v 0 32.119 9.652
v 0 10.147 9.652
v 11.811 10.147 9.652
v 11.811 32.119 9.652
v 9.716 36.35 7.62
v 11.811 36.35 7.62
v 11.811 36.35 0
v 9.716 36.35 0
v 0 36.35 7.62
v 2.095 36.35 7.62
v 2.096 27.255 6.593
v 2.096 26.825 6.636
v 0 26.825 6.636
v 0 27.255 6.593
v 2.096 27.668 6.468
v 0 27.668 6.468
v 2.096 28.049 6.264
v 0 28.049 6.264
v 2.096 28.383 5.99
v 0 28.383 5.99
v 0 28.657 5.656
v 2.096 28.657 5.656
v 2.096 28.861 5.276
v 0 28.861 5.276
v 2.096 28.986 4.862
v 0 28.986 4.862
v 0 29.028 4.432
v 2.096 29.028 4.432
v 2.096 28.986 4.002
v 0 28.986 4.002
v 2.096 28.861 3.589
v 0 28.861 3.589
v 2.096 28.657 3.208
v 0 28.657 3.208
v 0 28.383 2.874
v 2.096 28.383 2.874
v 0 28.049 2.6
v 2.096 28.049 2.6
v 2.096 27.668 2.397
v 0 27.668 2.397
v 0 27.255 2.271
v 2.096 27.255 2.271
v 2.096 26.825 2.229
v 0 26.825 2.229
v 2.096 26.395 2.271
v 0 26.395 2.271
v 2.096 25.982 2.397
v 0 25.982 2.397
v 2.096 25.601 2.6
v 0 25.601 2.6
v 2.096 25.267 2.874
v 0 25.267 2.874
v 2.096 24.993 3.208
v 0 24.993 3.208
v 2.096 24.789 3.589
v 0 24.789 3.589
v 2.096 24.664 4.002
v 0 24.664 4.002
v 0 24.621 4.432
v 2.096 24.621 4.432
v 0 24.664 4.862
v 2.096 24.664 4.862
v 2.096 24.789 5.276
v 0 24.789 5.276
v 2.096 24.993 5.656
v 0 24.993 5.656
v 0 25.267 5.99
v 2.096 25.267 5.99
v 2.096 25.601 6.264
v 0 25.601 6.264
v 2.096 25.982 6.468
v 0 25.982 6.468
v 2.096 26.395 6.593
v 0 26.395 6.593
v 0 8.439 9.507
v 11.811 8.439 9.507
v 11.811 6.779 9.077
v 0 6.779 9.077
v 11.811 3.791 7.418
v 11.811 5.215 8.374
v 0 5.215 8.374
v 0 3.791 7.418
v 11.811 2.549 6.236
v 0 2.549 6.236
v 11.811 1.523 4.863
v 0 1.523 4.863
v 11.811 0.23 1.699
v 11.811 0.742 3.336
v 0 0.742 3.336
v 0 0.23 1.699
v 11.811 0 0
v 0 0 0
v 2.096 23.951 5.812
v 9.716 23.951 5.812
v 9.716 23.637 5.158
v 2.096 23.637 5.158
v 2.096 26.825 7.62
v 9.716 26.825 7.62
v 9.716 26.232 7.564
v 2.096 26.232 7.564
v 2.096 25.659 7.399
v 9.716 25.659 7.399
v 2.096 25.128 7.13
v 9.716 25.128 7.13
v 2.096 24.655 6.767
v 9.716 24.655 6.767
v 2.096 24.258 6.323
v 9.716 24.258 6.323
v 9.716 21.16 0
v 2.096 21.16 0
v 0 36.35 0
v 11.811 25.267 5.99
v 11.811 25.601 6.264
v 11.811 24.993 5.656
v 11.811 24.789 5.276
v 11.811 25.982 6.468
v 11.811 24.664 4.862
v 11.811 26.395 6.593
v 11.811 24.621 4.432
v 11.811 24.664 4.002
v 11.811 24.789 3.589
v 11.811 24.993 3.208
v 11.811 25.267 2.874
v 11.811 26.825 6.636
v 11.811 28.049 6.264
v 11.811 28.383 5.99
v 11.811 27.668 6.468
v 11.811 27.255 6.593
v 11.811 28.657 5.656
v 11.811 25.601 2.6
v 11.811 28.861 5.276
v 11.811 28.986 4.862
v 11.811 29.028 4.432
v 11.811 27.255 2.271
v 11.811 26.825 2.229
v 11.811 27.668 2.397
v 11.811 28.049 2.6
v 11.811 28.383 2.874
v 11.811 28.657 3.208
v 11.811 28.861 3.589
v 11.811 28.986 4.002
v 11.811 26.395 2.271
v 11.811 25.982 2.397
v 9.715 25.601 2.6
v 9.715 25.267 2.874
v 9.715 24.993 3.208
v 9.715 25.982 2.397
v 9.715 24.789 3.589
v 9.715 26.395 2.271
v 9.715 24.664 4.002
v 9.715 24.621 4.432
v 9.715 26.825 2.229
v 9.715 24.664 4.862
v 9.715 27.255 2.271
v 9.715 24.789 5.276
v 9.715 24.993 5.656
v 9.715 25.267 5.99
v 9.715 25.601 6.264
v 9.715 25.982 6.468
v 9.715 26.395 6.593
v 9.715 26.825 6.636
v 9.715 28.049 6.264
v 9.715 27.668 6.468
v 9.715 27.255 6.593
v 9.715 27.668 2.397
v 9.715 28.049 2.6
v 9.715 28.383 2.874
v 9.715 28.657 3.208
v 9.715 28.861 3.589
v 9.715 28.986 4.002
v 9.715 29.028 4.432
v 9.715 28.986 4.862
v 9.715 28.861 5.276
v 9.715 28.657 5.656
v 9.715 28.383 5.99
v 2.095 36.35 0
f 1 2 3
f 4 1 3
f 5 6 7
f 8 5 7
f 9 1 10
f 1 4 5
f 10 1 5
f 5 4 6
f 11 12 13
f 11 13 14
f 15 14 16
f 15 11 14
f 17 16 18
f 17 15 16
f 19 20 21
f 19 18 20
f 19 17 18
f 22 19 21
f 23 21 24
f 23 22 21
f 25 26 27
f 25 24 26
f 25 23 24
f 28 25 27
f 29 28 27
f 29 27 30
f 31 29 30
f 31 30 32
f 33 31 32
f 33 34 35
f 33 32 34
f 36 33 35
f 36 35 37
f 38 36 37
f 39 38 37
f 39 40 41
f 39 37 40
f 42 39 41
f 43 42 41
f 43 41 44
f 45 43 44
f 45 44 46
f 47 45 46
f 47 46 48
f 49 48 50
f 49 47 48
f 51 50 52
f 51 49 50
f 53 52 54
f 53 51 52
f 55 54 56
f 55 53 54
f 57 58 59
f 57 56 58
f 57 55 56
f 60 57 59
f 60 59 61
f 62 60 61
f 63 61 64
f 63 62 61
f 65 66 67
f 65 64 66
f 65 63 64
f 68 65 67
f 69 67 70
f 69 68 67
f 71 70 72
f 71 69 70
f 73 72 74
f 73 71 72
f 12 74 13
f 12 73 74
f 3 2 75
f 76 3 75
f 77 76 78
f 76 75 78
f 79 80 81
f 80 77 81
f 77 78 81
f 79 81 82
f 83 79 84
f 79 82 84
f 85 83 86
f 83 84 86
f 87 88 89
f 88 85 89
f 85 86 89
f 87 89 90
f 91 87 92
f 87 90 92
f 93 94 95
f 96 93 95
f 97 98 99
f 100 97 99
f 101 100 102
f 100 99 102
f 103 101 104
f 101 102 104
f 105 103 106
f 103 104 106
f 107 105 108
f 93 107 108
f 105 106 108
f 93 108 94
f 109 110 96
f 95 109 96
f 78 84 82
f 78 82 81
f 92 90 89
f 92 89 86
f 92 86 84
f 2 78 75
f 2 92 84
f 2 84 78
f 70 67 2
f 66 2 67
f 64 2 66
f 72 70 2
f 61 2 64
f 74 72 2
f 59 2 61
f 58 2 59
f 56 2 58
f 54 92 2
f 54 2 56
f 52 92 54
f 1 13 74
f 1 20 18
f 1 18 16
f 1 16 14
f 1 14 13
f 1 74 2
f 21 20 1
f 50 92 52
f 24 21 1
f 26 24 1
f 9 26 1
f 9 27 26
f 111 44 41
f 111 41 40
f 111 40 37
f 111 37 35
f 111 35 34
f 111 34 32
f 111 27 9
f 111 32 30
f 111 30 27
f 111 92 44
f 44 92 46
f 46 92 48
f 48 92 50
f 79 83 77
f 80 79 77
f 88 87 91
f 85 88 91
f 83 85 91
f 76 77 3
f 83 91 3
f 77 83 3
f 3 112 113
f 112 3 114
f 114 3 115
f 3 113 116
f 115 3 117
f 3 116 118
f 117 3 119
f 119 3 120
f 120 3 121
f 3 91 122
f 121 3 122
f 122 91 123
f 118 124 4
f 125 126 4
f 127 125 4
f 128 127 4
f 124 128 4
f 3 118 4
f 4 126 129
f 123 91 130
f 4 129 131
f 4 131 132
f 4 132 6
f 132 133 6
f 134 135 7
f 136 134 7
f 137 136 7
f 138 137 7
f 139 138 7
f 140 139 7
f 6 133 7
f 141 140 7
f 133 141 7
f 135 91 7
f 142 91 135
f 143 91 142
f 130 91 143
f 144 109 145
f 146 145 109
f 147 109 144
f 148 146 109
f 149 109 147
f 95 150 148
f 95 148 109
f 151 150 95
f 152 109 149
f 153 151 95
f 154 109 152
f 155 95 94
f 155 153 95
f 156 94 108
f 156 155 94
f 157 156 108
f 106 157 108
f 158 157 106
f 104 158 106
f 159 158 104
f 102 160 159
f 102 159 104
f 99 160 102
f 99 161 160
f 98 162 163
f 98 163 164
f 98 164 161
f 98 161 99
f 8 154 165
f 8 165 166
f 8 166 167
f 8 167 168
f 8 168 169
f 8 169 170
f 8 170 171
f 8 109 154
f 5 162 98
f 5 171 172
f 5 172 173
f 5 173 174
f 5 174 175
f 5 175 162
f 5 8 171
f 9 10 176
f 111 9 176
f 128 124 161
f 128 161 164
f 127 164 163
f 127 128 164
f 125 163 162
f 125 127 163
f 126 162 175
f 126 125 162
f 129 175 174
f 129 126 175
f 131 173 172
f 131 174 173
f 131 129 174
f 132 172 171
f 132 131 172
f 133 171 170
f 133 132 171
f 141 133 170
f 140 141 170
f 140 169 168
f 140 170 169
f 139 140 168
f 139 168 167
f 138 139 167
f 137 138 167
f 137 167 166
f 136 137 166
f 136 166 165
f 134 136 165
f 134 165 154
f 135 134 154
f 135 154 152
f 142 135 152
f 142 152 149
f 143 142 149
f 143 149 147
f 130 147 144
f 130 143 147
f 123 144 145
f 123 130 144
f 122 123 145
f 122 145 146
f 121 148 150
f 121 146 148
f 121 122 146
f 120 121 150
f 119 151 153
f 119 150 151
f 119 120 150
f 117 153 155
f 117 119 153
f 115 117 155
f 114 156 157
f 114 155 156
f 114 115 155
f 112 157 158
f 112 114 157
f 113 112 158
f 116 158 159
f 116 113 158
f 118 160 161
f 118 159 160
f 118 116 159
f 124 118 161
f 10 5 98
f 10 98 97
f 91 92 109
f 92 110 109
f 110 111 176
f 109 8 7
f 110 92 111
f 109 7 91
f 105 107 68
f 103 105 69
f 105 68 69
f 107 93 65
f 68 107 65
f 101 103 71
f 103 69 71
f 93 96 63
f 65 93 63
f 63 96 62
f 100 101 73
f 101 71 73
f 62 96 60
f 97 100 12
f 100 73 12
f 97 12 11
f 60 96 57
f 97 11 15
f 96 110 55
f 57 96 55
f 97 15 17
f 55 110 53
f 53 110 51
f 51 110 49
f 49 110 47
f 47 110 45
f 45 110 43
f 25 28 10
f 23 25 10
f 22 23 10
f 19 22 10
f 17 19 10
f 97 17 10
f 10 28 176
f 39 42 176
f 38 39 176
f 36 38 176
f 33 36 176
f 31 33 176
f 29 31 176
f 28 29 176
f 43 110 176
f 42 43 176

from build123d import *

# Parameters (mm, degrees)
SKETCH1_W               = 11.811
SKETCH1_H               = 45.98924
BOSS_EXTRUDE1_DEPTH     = 9.652
FILLET5_R               = 4.826
SKETCH2_W               = 7.62
SKETCH2_H               = 22.352
CUT_EXTRUDE1_DEPTH      = 7.62
CUT_EXTRUDE2_DEPTH      = 49.452771033
CUT_EXTRUDE2_DEPTH_BACK = 49.452771033
SKETCH3_R               = 2.20345
FILLET4_R               = 4.826
FILLET6_R               = 10.16
CUT_EXTRUDE3_DEPTH      = 49.452771033
CUT_EXTRUDE4_DEPTH      = 7.62
BOSS_EXTRUDE2_DEPTH     = 7.62


with BuildPart() as part:
    # Sketch1 → Boss-Extrude1 (new body)
    with BuildSketch(Plane.XY):
        with Locations((5.9055, 22.99462)):
            Rectangle(SKETCH1_W, SKETCH1_H)
    extrude(amount=BOSS_EXTRUDE1_DEPTH)

    # Fillet5
    fillet5_edges = [part.edges().sort_by_distance(p)[0] for p in [
        (5.9055, 45.98924, 0),
    ]]
    fillet(fillet5_edges, radius=FILLET5_R)

    # Sketch2 → Cut-Extrude1 (cut)
    with BuildSketch(Plane(origin=(0, 0, 0), x_dir=(-1, 0, 0), z_dir=(0, 0, -1))):
        with Locations((-5.9055, 34.81324)):
            Rectangle(SKETCH2_W, SKETCH2_H)
    extrude(amount=-CUT_EXTRUDE1_DEPTH, mode=Mode.SUBTRACT)

    # Sketch3 → Cut-Extrude2 (cut, two sides: drawn at the far end of the back side and taken through both)
    with BuildSketch(Plane.ZY.offset(-CUT_EXTRUDE2_DEPTH_BACK)):
        with Locations((4.4323, 26.82494)):
            Circle(SKETCH3_R)
    extrude(amount=CUT_EXTRUDE2_DEPTH + CUT_EXTRUDE2_DEPTH_BACK, mode=Mode.SUBTRACT)

    # Fillet4
    # the kernel refuses this fillet: 4.826 mm, written as the material it takes off along each edge
    with BuildSketch(Plane(origin=(23.876, 45.98924, 9.652), x_dir=(0, 0, -1), z_dir=(-1, 0, 0))) as fillet4_piece_1:
        with BuildLine():
            CenterArc((FILLET4_R, FILLET4_R), FILLET4_R, 180, 90)
            Line((0, FILLET4_R), (0, 0))
            Line((0, 0), (FILLET4_R, 0))
        make_face()
    extrude(amount=35.941, mode=Mode.SUBTRACT)

    # Fillet6
    # the kernel refuses this fillet: 10.16 mm, written as the material it takes off along each edge
    with BuildSketch(Plane(origin=(-25.368230131, 0, 9.652), x_dir=(0, 1, 0), z_dir=(1, 0, 0))) as fillet6_piece_1:
        with BuildLine():
            CenterArc((10.147292053, -10.16), FILLET6_R, 90, 87.134016017)
            Line((0, -9.652), (-0.202945841, -9.64184))
            ThreePointArc((-0.202945841, -9.64184), (-0.2032, -4.826), (-0.2032, 0))
            Line((-0.2032, 0), (0, 0.2032))
            Line((0, 0.2032), (10.147292053, 0.2032))
            Line((10.147292053, 0.2032), (10.147292053, 0))
        make_face()
    extrude(amount=62.547460263, mode=Mode.SUBTRACT)

    # Sketch4 → Cut-Extrude3 (cut, through all)
    with BuildSketch(Plane(origin=(11.811, 0, 0), x_dir=(0, 0, -1), z_dir=(1, 0, 0))):
        Polygon((-9.652, 32.118813088), (-7.62, 36.34994), (0, 36.34994), (0, 45.98924), (-9.652, 45.98924), align=None)
    extrude(amount=-CUT_EXTRUDE3_DEPTH, mode=Mode.SUBTRACT)

    # Sketch5 → Cut-Extrude4 (cut)
    with BuildSketch(Plane.ZY.offset(-9.7155)):
        Polygon((0, 21.160076085), (5.158068358, 23.63724), (0, 23.63724), align=None)
    extrude(amount=CUT_EXTRUDE4_DEPTH, mode=Mode.SUBTRACT)

    # Sketch5<3> → Boss-Extrude2 (add)
    with BuildSketch(Plane.ZY.offset(-9.7155)):
        with BuildLine():
            Line((5.812301369, 23.951435604), (5.158068358, 23.63724))
            Line((5.158068358, 23.63724), (7.62, 23.63724))
            Line((7.62, 23.63724), (7.62, 26.82494))
            ThreePointArc((7.62, 26.82494), (7.130490287, 25.127530072), (5.812301369, 23.951435604))
        make_face()
    extrude(amount=BOSS_EXTRUDE2_DEPTH)


solid = part.part
